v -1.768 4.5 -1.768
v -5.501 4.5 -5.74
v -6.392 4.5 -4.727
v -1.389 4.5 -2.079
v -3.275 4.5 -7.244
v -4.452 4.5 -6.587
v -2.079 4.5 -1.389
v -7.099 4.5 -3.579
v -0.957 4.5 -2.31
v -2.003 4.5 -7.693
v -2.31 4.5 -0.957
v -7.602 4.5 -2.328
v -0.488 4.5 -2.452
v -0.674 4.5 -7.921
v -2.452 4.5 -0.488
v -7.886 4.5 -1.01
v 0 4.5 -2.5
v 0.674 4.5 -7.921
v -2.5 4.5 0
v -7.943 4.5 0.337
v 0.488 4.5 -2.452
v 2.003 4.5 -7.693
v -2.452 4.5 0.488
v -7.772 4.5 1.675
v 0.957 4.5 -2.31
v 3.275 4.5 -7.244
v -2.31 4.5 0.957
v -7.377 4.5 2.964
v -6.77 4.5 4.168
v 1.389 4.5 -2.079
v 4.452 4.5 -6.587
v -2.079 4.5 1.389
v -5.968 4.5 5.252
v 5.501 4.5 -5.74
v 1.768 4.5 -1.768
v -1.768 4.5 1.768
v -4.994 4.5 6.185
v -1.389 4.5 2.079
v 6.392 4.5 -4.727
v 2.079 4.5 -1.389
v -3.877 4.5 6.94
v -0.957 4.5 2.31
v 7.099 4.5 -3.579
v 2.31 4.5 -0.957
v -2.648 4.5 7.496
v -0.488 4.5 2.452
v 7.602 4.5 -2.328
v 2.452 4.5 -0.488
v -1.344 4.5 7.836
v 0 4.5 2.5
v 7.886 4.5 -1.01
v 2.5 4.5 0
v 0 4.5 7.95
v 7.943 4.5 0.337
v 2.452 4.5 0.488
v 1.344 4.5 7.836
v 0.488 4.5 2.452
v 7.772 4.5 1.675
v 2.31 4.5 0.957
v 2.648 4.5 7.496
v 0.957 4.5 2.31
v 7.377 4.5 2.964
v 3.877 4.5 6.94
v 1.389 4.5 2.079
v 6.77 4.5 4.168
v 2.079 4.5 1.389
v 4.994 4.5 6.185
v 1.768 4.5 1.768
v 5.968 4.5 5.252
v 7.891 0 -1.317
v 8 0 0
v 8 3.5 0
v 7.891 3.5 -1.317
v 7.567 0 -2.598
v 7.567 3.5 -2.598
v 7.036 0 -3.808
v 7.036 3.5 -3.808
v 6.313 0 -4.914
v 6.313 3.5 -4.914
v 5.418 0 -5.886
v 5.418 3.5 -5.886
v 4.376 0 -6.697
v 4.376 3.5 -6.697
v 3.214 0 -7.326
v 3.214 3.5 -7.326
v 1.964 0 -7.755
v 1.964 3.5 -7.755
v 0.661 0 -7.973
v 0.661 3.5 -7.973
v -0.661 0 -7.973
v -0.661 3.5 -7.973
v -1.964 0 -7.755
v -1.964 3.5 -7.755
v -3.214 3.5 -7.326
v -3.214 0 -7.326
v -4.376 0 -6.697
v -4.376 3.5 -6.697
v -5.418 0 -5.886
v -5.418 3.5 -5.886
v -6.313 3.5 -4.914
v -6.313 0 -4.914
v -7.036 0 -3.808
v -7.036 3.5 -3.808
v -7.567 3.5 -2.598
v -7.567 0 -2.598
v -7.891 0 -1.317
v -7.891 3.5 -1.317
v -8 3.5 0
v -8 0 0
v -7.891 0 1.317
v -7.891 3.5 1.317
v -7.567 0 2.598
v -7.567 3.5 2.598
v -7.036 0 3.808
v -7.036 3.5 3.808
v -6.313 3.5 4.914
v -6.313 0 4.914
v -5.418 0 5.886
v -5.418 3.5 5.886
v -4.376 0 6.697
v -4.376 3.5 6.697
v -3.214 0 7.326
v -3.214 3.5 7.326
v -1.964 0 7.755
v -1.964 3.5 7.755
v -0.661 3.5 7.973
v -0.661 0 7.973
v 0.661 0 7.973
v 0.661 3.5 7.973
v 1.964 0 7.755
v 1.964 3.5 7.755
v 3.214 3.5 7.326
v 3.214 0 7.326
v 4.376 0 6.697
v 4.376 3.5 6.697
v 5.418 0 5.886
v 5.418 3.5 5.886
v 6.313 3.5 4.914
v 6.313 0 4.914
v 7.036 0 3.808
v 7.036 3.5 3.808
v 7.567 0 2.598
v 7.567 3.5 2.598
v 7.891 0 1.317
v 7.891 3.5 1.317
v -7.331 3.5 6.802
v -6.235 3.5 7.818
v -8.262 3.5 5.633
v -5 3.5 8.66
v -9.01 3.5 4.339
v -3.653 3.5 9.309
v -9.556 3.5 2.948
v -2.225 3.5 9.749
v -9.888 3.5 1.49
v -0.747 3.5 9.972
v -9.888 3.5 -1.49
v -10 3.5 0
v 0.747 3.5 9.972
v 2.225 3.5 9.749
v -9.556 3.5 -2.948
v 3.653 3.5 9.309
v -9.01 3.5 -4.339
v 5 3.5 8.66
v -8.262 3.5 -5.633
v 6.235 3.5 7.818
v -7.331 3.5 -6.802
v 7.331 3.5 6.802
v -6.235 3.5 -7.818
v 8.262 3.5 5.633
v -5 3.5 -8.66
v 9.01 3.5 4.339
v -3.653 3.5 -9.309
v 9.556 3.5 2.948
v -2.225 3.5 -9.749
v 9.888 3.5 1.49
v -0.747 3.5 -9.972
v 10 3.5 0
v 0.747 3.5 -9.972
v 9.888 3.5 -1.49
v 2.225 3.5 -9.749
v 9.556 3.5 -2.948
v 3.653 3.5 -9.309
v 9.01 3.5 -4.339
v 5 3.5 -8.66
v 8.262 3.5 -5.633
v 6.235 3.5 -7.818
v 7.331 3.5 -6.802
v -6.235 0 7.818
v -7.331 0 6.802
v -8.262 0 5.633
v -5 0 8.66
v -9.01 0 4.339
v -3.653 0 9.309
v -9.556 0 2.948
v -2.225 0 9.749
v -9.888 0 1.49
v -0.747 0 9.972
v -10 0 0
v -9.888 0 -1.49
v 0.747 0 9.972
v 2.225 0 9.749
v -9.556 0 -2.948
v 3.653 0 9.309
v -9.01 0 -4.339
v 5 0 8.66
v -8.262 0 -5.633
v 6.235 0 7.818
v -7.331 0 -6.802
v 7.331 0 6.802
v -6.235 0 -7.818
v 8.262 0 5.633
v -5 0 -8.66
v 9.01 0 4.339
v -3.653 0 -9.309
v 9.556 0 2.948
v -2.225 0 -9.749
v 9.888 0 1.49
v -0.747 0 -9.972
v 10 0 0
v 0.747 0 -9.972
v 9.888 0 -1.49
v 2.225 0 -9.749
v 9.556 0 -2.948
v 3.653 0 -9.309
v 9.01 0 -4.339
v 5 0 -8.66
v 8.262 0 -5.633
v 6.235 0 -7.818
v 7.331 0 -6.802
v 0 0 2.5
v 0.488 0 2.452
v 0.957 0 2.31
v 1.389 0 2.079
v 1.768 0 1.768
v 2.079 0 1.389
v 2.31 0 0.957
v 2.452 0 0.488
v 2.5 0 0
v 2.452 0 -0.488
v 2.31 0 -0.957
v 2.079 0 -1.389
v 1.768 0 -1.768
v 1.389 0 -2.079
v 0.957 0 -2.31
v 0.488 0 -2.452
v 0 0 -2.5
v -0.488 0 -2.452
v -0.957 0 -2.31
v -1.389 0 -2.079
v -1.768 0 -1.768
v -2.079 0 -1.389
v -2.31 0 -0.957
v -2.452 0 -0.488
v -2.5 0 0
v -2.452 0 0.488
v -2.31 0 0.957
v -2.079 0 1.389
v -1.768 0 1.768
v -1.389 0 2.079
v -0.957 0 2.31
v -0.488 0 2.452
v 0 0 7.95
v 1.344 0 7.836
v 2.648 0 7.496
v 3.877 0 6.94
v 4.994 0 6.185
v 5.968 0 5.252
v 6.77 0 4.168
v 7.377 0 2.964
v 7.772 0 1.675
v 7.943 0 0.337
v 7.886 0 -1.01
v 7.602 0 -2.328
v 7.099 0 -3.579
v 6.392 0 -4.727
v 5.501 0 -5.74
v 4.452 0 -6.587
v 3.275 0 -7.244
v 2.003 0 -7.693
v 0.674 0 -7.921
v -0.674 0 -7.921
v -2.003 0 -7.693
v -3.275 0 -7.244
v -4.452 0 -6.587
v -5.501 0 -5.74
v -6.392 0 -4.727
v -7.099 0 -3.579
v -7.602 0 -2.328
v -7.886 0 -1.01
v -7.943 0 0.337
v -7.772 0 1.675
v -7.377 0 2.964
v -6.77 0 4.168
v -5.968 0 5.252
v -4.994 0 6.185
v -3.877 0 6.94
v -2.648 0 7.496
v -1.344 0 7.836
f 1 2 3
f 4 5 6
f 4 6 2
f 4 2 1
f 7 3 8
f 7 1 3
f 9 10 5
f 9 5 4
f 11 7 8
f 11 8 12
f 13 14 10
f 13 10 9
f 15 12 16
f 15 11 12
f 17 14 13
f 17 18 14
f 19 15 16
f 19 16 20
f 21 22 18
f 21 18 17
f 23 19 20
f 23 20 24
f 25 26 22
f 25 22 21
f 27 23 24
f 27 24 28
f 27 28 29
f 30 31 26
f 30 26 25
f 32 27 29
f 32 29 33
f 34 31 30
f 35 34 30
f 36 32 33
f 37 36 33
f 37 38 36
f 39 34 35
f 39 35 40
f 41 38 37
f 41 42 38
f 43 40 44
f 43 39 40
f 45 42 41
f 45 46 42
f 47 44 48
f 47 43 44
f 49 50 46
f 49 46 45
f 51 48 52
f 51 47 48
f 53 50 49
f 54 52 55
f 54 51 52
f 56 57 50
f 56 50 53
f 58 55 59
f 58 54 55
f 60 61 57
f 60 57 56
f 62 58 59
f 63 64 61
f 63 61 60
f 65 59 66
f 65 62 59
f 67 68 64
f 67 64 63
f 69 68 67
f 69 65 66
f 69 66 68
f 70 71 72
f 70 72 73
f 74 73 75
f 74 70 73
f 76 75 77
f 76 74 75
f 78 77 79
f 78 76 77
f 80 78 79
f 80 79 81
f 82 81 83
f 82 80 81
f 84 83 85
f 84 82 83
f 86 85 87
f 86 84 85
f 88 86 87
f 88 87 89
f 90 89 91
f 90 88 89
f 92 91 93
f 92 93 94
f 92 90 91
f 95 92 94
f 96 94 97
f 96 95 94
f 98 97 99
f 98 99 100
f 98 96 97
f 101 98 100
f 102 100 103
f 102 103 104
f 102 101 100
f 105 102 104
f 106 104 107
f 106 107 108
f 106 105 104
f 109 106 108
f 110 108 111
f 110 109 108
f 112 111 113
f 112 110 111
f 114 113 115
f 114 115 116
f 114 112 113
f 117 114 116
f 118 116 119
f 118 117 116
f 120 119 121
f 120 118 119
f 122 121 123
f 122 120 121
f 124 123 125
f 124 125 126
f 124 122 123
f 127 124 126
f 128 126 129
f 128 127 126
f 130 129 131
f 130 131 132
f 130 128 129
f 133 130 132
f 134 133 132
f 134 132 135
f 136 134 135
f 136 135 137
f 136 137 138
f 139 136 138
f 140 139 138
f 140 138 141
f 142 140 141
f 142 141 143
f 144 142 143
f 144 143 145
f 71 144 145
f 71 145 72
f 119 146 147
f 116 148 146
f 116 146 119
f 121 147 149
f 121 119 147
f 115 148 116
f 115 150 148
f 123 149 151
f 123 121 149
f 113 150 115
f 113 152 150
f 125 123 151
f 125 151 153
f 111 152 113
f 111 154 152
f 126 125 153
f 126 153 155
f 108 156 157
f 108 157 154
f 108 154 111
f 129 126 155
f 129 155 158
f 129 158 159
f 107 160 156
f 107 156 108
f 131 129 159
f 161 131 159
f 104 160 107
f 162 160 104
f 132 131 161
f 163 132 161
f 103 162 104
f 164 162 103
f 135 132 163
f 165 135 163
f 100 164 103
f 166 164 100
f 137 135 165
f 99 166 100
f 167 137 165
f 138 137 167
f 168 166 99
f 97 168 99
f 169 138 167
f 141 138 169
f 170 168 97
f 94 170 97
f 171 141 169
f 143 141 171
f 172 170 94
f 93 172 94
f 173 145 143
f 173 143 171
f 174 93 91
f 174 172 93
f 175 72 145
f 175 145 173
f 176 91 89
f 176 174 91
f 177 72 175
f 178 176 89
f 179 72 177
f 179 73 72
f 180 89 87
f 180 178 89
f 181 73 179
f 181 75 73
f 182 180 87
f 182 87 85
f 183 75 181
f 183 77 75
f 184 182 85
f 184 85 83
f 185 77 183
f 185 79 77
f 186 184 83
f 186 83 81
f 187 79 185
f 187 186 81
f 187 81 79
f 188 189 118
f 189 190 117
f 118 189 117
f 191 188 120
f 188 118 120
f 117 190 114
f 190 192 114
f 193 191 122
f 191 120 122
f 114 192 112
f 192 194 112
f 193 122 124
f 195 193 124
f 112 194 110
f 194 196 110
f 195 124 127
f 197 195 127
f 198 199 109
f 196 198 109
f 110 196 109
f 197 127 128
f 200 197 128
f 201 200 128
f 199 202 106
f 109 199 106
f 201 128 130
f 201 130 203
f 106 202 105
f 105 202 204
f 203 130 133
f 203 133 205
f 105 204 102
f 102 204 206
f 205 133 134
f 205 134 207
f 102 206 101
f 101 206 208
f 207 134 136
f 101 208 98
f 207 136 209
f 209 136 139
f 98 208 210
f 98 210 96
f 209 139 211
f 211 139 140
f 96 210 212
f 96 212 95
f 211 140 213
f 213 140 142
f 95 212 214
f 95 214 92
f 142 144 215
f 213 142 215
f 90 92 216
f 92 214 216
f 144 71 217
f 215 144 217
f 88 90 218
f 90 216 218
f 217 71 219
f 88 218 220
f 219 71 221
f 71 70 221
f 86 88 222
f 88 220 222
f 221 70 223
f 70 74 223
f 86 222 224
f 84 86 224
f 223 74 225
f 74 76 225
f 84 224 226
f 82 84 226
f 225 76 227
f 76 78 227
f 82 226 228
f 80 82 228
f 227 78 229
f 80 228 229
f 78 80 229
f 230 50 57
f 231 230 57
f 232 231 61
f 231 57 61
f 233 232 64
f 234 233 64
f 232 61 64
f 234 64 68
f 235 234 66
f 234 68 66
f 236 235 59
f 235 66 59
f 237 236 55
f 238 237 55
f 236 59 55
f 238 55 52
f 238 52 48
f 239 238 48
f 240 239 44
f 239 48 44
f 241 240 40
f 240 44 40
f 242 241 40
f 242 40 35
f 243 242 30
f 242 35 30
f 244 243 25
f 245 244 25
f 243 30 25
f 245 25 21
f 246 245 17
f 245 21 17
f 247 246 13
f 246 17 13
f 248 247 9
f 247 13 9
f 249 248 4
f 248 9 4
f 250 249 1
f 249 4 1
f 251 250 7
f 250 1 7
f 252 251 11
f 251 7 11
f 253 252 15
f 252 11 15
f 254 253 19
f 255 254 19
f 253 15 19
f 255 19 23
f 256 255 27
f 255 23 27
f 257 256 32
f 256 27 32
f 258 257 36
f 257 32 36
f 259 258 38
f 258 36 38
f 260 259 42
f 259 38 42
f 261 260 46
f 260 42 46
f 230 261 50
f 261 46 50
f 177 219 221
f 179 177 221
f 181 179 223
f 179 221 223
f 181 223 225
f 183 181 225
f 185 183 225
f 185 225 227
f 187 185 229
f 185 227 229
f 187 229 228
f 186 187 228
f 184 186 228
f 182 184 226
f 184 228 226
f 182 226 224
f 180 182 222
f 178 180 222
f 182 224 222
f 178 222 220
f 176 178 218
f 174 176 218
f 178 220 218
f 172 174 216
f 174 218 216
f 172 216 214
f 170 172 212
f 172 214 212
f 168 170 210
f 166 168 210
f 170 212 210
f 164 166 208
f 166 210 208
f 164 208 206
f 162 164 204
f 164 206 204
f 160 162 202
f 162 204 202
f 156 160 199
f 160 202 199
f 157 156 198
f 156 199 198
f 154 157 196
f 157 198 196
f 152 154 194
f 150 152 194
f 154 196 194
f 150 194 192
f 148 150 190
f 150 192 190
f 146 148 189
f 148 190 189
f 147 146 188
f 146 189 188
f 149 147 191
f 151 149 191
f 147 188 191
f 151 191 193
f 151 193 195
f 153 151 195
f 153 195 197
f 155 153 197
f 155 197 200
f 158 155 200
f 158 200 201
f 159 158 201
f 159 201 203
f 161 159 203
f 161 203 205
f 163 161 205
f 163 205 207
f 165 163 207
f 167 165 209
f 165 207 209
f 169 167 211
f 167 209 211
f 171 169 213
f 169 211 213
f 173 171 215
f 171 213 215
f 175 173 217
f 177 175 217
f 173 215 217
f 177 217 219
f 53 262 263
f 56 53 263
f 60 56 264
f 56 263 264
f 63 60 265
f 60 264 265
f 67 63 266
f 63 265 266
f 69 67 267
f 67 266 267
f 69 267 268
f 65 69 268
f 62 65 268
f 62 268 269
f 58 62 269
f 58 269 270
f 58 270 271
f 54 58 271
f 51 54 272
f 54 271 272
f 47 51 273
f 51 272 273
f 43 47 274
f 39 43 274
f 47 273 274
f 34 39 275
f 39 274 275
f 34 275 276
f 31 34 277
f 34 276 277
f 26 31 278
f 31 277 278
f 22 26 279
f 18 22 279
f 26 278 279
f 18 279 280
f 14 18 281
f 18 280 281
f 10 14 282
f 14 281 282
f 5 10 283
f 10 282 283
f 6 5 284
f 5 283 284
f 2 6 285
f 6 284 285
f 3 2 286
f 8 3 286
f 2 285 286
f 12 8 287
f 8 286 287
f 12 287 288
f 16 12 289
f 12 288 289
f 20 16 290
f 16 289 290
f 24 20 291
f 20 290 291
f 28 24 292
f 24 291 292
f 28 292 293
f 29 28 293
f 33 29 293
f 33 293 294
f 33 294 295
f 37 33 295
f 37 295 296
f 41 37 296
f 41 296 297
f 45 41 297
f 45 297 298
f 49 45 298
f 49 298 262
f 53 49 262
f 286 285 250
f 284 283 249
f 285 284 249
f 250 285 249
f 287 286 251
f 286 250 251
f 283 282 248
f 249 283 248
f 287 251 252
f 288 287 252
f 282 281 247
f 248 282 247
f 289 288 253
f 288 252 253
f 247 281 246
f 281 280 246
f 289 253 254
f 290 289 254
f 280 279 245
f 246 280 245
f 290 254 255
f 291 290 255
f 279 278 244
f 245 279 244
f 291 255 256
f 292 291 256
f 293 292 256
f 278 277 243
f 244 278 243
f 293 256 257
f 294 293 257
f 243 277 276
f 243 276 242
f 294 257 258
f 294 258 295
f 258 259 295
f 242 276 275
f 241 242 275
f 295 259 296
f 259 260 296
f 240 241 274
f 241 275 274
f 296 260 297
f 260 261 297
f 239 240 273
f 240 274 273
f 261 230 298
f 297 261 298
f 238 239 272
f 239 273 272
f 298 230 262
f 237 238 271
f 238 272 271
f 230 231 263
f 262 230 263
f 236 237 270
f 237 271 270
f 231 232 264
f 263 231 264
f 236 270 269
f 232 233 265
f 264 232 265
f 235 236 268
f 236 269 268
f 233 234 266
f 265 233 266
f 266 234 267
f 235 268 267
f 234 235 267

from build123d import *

# Parameters (mm, degrees)
SKETCH1_R                = 10
SKETCH1_R_2              = 8
EXTRUDE_THIN1_DEPTH      = 3.5
BOSS_EXTRUDE1_DEPTH      = 1
BOSS_EXTRUDE1_DEPTH_BACK = 3.5
SKETCH2_R                = 7.95
SKETCH3_R                = 2.5
CUT_EXTRUDE1_DEPTH       = 4.5


with BuildPart() as part:
    # Sketch1 → Extrude-Thin1 (new body)
    with BuildSketch(Plane(origin=(0, 0, 0), x_dir=(1, 0, 0), z_dir=(0, 1, 0))):
        Circle(SKETCH1_R)
        Circle(SKETCH1_R_2, mode=Mode.SUBTRACT)
    extrude(amount=EXTRUDE_THIN1_DEPTH)


with BuildPart() as body_2:
    # Sketch2 → Boss-Extrude1 (new, two sides: drawn at the far end of the back side and taken through both)
    with BuildSketch(Plane(origin=(0, 3.5, 0), x_dir=(1, 0, 0), z_dir=(0, 1, 0)).offset(-BOSS_EXTRUDE1_DEPTH_BACK)):
        with Locations(Location((0, 0, 0), (0, 0, 270))):
            Circle(SKETCH2_R)
    extrude(amount=BOSS_EXTRUDE1_DEPTH + BOSS_EXTRUDE1_DEPTH_BACK)

    # Sketch3 → Cut-Extrude1 (cut)
    with BuildSketch(Plane(origin=(0, 4.5, 0), x_dir=(1, 0, 0), z_dir=(0, 1, 0))):
        with Locations(Location((0, 0, 0), (0, 0, 270))):
            Circle(SKETCH3_R)
    extrude(amount=-CUT_EXTRUDE1_DEPTH, mode=Mode.SUBTRACT)


solid = Compound([part.part, body_2.part])
